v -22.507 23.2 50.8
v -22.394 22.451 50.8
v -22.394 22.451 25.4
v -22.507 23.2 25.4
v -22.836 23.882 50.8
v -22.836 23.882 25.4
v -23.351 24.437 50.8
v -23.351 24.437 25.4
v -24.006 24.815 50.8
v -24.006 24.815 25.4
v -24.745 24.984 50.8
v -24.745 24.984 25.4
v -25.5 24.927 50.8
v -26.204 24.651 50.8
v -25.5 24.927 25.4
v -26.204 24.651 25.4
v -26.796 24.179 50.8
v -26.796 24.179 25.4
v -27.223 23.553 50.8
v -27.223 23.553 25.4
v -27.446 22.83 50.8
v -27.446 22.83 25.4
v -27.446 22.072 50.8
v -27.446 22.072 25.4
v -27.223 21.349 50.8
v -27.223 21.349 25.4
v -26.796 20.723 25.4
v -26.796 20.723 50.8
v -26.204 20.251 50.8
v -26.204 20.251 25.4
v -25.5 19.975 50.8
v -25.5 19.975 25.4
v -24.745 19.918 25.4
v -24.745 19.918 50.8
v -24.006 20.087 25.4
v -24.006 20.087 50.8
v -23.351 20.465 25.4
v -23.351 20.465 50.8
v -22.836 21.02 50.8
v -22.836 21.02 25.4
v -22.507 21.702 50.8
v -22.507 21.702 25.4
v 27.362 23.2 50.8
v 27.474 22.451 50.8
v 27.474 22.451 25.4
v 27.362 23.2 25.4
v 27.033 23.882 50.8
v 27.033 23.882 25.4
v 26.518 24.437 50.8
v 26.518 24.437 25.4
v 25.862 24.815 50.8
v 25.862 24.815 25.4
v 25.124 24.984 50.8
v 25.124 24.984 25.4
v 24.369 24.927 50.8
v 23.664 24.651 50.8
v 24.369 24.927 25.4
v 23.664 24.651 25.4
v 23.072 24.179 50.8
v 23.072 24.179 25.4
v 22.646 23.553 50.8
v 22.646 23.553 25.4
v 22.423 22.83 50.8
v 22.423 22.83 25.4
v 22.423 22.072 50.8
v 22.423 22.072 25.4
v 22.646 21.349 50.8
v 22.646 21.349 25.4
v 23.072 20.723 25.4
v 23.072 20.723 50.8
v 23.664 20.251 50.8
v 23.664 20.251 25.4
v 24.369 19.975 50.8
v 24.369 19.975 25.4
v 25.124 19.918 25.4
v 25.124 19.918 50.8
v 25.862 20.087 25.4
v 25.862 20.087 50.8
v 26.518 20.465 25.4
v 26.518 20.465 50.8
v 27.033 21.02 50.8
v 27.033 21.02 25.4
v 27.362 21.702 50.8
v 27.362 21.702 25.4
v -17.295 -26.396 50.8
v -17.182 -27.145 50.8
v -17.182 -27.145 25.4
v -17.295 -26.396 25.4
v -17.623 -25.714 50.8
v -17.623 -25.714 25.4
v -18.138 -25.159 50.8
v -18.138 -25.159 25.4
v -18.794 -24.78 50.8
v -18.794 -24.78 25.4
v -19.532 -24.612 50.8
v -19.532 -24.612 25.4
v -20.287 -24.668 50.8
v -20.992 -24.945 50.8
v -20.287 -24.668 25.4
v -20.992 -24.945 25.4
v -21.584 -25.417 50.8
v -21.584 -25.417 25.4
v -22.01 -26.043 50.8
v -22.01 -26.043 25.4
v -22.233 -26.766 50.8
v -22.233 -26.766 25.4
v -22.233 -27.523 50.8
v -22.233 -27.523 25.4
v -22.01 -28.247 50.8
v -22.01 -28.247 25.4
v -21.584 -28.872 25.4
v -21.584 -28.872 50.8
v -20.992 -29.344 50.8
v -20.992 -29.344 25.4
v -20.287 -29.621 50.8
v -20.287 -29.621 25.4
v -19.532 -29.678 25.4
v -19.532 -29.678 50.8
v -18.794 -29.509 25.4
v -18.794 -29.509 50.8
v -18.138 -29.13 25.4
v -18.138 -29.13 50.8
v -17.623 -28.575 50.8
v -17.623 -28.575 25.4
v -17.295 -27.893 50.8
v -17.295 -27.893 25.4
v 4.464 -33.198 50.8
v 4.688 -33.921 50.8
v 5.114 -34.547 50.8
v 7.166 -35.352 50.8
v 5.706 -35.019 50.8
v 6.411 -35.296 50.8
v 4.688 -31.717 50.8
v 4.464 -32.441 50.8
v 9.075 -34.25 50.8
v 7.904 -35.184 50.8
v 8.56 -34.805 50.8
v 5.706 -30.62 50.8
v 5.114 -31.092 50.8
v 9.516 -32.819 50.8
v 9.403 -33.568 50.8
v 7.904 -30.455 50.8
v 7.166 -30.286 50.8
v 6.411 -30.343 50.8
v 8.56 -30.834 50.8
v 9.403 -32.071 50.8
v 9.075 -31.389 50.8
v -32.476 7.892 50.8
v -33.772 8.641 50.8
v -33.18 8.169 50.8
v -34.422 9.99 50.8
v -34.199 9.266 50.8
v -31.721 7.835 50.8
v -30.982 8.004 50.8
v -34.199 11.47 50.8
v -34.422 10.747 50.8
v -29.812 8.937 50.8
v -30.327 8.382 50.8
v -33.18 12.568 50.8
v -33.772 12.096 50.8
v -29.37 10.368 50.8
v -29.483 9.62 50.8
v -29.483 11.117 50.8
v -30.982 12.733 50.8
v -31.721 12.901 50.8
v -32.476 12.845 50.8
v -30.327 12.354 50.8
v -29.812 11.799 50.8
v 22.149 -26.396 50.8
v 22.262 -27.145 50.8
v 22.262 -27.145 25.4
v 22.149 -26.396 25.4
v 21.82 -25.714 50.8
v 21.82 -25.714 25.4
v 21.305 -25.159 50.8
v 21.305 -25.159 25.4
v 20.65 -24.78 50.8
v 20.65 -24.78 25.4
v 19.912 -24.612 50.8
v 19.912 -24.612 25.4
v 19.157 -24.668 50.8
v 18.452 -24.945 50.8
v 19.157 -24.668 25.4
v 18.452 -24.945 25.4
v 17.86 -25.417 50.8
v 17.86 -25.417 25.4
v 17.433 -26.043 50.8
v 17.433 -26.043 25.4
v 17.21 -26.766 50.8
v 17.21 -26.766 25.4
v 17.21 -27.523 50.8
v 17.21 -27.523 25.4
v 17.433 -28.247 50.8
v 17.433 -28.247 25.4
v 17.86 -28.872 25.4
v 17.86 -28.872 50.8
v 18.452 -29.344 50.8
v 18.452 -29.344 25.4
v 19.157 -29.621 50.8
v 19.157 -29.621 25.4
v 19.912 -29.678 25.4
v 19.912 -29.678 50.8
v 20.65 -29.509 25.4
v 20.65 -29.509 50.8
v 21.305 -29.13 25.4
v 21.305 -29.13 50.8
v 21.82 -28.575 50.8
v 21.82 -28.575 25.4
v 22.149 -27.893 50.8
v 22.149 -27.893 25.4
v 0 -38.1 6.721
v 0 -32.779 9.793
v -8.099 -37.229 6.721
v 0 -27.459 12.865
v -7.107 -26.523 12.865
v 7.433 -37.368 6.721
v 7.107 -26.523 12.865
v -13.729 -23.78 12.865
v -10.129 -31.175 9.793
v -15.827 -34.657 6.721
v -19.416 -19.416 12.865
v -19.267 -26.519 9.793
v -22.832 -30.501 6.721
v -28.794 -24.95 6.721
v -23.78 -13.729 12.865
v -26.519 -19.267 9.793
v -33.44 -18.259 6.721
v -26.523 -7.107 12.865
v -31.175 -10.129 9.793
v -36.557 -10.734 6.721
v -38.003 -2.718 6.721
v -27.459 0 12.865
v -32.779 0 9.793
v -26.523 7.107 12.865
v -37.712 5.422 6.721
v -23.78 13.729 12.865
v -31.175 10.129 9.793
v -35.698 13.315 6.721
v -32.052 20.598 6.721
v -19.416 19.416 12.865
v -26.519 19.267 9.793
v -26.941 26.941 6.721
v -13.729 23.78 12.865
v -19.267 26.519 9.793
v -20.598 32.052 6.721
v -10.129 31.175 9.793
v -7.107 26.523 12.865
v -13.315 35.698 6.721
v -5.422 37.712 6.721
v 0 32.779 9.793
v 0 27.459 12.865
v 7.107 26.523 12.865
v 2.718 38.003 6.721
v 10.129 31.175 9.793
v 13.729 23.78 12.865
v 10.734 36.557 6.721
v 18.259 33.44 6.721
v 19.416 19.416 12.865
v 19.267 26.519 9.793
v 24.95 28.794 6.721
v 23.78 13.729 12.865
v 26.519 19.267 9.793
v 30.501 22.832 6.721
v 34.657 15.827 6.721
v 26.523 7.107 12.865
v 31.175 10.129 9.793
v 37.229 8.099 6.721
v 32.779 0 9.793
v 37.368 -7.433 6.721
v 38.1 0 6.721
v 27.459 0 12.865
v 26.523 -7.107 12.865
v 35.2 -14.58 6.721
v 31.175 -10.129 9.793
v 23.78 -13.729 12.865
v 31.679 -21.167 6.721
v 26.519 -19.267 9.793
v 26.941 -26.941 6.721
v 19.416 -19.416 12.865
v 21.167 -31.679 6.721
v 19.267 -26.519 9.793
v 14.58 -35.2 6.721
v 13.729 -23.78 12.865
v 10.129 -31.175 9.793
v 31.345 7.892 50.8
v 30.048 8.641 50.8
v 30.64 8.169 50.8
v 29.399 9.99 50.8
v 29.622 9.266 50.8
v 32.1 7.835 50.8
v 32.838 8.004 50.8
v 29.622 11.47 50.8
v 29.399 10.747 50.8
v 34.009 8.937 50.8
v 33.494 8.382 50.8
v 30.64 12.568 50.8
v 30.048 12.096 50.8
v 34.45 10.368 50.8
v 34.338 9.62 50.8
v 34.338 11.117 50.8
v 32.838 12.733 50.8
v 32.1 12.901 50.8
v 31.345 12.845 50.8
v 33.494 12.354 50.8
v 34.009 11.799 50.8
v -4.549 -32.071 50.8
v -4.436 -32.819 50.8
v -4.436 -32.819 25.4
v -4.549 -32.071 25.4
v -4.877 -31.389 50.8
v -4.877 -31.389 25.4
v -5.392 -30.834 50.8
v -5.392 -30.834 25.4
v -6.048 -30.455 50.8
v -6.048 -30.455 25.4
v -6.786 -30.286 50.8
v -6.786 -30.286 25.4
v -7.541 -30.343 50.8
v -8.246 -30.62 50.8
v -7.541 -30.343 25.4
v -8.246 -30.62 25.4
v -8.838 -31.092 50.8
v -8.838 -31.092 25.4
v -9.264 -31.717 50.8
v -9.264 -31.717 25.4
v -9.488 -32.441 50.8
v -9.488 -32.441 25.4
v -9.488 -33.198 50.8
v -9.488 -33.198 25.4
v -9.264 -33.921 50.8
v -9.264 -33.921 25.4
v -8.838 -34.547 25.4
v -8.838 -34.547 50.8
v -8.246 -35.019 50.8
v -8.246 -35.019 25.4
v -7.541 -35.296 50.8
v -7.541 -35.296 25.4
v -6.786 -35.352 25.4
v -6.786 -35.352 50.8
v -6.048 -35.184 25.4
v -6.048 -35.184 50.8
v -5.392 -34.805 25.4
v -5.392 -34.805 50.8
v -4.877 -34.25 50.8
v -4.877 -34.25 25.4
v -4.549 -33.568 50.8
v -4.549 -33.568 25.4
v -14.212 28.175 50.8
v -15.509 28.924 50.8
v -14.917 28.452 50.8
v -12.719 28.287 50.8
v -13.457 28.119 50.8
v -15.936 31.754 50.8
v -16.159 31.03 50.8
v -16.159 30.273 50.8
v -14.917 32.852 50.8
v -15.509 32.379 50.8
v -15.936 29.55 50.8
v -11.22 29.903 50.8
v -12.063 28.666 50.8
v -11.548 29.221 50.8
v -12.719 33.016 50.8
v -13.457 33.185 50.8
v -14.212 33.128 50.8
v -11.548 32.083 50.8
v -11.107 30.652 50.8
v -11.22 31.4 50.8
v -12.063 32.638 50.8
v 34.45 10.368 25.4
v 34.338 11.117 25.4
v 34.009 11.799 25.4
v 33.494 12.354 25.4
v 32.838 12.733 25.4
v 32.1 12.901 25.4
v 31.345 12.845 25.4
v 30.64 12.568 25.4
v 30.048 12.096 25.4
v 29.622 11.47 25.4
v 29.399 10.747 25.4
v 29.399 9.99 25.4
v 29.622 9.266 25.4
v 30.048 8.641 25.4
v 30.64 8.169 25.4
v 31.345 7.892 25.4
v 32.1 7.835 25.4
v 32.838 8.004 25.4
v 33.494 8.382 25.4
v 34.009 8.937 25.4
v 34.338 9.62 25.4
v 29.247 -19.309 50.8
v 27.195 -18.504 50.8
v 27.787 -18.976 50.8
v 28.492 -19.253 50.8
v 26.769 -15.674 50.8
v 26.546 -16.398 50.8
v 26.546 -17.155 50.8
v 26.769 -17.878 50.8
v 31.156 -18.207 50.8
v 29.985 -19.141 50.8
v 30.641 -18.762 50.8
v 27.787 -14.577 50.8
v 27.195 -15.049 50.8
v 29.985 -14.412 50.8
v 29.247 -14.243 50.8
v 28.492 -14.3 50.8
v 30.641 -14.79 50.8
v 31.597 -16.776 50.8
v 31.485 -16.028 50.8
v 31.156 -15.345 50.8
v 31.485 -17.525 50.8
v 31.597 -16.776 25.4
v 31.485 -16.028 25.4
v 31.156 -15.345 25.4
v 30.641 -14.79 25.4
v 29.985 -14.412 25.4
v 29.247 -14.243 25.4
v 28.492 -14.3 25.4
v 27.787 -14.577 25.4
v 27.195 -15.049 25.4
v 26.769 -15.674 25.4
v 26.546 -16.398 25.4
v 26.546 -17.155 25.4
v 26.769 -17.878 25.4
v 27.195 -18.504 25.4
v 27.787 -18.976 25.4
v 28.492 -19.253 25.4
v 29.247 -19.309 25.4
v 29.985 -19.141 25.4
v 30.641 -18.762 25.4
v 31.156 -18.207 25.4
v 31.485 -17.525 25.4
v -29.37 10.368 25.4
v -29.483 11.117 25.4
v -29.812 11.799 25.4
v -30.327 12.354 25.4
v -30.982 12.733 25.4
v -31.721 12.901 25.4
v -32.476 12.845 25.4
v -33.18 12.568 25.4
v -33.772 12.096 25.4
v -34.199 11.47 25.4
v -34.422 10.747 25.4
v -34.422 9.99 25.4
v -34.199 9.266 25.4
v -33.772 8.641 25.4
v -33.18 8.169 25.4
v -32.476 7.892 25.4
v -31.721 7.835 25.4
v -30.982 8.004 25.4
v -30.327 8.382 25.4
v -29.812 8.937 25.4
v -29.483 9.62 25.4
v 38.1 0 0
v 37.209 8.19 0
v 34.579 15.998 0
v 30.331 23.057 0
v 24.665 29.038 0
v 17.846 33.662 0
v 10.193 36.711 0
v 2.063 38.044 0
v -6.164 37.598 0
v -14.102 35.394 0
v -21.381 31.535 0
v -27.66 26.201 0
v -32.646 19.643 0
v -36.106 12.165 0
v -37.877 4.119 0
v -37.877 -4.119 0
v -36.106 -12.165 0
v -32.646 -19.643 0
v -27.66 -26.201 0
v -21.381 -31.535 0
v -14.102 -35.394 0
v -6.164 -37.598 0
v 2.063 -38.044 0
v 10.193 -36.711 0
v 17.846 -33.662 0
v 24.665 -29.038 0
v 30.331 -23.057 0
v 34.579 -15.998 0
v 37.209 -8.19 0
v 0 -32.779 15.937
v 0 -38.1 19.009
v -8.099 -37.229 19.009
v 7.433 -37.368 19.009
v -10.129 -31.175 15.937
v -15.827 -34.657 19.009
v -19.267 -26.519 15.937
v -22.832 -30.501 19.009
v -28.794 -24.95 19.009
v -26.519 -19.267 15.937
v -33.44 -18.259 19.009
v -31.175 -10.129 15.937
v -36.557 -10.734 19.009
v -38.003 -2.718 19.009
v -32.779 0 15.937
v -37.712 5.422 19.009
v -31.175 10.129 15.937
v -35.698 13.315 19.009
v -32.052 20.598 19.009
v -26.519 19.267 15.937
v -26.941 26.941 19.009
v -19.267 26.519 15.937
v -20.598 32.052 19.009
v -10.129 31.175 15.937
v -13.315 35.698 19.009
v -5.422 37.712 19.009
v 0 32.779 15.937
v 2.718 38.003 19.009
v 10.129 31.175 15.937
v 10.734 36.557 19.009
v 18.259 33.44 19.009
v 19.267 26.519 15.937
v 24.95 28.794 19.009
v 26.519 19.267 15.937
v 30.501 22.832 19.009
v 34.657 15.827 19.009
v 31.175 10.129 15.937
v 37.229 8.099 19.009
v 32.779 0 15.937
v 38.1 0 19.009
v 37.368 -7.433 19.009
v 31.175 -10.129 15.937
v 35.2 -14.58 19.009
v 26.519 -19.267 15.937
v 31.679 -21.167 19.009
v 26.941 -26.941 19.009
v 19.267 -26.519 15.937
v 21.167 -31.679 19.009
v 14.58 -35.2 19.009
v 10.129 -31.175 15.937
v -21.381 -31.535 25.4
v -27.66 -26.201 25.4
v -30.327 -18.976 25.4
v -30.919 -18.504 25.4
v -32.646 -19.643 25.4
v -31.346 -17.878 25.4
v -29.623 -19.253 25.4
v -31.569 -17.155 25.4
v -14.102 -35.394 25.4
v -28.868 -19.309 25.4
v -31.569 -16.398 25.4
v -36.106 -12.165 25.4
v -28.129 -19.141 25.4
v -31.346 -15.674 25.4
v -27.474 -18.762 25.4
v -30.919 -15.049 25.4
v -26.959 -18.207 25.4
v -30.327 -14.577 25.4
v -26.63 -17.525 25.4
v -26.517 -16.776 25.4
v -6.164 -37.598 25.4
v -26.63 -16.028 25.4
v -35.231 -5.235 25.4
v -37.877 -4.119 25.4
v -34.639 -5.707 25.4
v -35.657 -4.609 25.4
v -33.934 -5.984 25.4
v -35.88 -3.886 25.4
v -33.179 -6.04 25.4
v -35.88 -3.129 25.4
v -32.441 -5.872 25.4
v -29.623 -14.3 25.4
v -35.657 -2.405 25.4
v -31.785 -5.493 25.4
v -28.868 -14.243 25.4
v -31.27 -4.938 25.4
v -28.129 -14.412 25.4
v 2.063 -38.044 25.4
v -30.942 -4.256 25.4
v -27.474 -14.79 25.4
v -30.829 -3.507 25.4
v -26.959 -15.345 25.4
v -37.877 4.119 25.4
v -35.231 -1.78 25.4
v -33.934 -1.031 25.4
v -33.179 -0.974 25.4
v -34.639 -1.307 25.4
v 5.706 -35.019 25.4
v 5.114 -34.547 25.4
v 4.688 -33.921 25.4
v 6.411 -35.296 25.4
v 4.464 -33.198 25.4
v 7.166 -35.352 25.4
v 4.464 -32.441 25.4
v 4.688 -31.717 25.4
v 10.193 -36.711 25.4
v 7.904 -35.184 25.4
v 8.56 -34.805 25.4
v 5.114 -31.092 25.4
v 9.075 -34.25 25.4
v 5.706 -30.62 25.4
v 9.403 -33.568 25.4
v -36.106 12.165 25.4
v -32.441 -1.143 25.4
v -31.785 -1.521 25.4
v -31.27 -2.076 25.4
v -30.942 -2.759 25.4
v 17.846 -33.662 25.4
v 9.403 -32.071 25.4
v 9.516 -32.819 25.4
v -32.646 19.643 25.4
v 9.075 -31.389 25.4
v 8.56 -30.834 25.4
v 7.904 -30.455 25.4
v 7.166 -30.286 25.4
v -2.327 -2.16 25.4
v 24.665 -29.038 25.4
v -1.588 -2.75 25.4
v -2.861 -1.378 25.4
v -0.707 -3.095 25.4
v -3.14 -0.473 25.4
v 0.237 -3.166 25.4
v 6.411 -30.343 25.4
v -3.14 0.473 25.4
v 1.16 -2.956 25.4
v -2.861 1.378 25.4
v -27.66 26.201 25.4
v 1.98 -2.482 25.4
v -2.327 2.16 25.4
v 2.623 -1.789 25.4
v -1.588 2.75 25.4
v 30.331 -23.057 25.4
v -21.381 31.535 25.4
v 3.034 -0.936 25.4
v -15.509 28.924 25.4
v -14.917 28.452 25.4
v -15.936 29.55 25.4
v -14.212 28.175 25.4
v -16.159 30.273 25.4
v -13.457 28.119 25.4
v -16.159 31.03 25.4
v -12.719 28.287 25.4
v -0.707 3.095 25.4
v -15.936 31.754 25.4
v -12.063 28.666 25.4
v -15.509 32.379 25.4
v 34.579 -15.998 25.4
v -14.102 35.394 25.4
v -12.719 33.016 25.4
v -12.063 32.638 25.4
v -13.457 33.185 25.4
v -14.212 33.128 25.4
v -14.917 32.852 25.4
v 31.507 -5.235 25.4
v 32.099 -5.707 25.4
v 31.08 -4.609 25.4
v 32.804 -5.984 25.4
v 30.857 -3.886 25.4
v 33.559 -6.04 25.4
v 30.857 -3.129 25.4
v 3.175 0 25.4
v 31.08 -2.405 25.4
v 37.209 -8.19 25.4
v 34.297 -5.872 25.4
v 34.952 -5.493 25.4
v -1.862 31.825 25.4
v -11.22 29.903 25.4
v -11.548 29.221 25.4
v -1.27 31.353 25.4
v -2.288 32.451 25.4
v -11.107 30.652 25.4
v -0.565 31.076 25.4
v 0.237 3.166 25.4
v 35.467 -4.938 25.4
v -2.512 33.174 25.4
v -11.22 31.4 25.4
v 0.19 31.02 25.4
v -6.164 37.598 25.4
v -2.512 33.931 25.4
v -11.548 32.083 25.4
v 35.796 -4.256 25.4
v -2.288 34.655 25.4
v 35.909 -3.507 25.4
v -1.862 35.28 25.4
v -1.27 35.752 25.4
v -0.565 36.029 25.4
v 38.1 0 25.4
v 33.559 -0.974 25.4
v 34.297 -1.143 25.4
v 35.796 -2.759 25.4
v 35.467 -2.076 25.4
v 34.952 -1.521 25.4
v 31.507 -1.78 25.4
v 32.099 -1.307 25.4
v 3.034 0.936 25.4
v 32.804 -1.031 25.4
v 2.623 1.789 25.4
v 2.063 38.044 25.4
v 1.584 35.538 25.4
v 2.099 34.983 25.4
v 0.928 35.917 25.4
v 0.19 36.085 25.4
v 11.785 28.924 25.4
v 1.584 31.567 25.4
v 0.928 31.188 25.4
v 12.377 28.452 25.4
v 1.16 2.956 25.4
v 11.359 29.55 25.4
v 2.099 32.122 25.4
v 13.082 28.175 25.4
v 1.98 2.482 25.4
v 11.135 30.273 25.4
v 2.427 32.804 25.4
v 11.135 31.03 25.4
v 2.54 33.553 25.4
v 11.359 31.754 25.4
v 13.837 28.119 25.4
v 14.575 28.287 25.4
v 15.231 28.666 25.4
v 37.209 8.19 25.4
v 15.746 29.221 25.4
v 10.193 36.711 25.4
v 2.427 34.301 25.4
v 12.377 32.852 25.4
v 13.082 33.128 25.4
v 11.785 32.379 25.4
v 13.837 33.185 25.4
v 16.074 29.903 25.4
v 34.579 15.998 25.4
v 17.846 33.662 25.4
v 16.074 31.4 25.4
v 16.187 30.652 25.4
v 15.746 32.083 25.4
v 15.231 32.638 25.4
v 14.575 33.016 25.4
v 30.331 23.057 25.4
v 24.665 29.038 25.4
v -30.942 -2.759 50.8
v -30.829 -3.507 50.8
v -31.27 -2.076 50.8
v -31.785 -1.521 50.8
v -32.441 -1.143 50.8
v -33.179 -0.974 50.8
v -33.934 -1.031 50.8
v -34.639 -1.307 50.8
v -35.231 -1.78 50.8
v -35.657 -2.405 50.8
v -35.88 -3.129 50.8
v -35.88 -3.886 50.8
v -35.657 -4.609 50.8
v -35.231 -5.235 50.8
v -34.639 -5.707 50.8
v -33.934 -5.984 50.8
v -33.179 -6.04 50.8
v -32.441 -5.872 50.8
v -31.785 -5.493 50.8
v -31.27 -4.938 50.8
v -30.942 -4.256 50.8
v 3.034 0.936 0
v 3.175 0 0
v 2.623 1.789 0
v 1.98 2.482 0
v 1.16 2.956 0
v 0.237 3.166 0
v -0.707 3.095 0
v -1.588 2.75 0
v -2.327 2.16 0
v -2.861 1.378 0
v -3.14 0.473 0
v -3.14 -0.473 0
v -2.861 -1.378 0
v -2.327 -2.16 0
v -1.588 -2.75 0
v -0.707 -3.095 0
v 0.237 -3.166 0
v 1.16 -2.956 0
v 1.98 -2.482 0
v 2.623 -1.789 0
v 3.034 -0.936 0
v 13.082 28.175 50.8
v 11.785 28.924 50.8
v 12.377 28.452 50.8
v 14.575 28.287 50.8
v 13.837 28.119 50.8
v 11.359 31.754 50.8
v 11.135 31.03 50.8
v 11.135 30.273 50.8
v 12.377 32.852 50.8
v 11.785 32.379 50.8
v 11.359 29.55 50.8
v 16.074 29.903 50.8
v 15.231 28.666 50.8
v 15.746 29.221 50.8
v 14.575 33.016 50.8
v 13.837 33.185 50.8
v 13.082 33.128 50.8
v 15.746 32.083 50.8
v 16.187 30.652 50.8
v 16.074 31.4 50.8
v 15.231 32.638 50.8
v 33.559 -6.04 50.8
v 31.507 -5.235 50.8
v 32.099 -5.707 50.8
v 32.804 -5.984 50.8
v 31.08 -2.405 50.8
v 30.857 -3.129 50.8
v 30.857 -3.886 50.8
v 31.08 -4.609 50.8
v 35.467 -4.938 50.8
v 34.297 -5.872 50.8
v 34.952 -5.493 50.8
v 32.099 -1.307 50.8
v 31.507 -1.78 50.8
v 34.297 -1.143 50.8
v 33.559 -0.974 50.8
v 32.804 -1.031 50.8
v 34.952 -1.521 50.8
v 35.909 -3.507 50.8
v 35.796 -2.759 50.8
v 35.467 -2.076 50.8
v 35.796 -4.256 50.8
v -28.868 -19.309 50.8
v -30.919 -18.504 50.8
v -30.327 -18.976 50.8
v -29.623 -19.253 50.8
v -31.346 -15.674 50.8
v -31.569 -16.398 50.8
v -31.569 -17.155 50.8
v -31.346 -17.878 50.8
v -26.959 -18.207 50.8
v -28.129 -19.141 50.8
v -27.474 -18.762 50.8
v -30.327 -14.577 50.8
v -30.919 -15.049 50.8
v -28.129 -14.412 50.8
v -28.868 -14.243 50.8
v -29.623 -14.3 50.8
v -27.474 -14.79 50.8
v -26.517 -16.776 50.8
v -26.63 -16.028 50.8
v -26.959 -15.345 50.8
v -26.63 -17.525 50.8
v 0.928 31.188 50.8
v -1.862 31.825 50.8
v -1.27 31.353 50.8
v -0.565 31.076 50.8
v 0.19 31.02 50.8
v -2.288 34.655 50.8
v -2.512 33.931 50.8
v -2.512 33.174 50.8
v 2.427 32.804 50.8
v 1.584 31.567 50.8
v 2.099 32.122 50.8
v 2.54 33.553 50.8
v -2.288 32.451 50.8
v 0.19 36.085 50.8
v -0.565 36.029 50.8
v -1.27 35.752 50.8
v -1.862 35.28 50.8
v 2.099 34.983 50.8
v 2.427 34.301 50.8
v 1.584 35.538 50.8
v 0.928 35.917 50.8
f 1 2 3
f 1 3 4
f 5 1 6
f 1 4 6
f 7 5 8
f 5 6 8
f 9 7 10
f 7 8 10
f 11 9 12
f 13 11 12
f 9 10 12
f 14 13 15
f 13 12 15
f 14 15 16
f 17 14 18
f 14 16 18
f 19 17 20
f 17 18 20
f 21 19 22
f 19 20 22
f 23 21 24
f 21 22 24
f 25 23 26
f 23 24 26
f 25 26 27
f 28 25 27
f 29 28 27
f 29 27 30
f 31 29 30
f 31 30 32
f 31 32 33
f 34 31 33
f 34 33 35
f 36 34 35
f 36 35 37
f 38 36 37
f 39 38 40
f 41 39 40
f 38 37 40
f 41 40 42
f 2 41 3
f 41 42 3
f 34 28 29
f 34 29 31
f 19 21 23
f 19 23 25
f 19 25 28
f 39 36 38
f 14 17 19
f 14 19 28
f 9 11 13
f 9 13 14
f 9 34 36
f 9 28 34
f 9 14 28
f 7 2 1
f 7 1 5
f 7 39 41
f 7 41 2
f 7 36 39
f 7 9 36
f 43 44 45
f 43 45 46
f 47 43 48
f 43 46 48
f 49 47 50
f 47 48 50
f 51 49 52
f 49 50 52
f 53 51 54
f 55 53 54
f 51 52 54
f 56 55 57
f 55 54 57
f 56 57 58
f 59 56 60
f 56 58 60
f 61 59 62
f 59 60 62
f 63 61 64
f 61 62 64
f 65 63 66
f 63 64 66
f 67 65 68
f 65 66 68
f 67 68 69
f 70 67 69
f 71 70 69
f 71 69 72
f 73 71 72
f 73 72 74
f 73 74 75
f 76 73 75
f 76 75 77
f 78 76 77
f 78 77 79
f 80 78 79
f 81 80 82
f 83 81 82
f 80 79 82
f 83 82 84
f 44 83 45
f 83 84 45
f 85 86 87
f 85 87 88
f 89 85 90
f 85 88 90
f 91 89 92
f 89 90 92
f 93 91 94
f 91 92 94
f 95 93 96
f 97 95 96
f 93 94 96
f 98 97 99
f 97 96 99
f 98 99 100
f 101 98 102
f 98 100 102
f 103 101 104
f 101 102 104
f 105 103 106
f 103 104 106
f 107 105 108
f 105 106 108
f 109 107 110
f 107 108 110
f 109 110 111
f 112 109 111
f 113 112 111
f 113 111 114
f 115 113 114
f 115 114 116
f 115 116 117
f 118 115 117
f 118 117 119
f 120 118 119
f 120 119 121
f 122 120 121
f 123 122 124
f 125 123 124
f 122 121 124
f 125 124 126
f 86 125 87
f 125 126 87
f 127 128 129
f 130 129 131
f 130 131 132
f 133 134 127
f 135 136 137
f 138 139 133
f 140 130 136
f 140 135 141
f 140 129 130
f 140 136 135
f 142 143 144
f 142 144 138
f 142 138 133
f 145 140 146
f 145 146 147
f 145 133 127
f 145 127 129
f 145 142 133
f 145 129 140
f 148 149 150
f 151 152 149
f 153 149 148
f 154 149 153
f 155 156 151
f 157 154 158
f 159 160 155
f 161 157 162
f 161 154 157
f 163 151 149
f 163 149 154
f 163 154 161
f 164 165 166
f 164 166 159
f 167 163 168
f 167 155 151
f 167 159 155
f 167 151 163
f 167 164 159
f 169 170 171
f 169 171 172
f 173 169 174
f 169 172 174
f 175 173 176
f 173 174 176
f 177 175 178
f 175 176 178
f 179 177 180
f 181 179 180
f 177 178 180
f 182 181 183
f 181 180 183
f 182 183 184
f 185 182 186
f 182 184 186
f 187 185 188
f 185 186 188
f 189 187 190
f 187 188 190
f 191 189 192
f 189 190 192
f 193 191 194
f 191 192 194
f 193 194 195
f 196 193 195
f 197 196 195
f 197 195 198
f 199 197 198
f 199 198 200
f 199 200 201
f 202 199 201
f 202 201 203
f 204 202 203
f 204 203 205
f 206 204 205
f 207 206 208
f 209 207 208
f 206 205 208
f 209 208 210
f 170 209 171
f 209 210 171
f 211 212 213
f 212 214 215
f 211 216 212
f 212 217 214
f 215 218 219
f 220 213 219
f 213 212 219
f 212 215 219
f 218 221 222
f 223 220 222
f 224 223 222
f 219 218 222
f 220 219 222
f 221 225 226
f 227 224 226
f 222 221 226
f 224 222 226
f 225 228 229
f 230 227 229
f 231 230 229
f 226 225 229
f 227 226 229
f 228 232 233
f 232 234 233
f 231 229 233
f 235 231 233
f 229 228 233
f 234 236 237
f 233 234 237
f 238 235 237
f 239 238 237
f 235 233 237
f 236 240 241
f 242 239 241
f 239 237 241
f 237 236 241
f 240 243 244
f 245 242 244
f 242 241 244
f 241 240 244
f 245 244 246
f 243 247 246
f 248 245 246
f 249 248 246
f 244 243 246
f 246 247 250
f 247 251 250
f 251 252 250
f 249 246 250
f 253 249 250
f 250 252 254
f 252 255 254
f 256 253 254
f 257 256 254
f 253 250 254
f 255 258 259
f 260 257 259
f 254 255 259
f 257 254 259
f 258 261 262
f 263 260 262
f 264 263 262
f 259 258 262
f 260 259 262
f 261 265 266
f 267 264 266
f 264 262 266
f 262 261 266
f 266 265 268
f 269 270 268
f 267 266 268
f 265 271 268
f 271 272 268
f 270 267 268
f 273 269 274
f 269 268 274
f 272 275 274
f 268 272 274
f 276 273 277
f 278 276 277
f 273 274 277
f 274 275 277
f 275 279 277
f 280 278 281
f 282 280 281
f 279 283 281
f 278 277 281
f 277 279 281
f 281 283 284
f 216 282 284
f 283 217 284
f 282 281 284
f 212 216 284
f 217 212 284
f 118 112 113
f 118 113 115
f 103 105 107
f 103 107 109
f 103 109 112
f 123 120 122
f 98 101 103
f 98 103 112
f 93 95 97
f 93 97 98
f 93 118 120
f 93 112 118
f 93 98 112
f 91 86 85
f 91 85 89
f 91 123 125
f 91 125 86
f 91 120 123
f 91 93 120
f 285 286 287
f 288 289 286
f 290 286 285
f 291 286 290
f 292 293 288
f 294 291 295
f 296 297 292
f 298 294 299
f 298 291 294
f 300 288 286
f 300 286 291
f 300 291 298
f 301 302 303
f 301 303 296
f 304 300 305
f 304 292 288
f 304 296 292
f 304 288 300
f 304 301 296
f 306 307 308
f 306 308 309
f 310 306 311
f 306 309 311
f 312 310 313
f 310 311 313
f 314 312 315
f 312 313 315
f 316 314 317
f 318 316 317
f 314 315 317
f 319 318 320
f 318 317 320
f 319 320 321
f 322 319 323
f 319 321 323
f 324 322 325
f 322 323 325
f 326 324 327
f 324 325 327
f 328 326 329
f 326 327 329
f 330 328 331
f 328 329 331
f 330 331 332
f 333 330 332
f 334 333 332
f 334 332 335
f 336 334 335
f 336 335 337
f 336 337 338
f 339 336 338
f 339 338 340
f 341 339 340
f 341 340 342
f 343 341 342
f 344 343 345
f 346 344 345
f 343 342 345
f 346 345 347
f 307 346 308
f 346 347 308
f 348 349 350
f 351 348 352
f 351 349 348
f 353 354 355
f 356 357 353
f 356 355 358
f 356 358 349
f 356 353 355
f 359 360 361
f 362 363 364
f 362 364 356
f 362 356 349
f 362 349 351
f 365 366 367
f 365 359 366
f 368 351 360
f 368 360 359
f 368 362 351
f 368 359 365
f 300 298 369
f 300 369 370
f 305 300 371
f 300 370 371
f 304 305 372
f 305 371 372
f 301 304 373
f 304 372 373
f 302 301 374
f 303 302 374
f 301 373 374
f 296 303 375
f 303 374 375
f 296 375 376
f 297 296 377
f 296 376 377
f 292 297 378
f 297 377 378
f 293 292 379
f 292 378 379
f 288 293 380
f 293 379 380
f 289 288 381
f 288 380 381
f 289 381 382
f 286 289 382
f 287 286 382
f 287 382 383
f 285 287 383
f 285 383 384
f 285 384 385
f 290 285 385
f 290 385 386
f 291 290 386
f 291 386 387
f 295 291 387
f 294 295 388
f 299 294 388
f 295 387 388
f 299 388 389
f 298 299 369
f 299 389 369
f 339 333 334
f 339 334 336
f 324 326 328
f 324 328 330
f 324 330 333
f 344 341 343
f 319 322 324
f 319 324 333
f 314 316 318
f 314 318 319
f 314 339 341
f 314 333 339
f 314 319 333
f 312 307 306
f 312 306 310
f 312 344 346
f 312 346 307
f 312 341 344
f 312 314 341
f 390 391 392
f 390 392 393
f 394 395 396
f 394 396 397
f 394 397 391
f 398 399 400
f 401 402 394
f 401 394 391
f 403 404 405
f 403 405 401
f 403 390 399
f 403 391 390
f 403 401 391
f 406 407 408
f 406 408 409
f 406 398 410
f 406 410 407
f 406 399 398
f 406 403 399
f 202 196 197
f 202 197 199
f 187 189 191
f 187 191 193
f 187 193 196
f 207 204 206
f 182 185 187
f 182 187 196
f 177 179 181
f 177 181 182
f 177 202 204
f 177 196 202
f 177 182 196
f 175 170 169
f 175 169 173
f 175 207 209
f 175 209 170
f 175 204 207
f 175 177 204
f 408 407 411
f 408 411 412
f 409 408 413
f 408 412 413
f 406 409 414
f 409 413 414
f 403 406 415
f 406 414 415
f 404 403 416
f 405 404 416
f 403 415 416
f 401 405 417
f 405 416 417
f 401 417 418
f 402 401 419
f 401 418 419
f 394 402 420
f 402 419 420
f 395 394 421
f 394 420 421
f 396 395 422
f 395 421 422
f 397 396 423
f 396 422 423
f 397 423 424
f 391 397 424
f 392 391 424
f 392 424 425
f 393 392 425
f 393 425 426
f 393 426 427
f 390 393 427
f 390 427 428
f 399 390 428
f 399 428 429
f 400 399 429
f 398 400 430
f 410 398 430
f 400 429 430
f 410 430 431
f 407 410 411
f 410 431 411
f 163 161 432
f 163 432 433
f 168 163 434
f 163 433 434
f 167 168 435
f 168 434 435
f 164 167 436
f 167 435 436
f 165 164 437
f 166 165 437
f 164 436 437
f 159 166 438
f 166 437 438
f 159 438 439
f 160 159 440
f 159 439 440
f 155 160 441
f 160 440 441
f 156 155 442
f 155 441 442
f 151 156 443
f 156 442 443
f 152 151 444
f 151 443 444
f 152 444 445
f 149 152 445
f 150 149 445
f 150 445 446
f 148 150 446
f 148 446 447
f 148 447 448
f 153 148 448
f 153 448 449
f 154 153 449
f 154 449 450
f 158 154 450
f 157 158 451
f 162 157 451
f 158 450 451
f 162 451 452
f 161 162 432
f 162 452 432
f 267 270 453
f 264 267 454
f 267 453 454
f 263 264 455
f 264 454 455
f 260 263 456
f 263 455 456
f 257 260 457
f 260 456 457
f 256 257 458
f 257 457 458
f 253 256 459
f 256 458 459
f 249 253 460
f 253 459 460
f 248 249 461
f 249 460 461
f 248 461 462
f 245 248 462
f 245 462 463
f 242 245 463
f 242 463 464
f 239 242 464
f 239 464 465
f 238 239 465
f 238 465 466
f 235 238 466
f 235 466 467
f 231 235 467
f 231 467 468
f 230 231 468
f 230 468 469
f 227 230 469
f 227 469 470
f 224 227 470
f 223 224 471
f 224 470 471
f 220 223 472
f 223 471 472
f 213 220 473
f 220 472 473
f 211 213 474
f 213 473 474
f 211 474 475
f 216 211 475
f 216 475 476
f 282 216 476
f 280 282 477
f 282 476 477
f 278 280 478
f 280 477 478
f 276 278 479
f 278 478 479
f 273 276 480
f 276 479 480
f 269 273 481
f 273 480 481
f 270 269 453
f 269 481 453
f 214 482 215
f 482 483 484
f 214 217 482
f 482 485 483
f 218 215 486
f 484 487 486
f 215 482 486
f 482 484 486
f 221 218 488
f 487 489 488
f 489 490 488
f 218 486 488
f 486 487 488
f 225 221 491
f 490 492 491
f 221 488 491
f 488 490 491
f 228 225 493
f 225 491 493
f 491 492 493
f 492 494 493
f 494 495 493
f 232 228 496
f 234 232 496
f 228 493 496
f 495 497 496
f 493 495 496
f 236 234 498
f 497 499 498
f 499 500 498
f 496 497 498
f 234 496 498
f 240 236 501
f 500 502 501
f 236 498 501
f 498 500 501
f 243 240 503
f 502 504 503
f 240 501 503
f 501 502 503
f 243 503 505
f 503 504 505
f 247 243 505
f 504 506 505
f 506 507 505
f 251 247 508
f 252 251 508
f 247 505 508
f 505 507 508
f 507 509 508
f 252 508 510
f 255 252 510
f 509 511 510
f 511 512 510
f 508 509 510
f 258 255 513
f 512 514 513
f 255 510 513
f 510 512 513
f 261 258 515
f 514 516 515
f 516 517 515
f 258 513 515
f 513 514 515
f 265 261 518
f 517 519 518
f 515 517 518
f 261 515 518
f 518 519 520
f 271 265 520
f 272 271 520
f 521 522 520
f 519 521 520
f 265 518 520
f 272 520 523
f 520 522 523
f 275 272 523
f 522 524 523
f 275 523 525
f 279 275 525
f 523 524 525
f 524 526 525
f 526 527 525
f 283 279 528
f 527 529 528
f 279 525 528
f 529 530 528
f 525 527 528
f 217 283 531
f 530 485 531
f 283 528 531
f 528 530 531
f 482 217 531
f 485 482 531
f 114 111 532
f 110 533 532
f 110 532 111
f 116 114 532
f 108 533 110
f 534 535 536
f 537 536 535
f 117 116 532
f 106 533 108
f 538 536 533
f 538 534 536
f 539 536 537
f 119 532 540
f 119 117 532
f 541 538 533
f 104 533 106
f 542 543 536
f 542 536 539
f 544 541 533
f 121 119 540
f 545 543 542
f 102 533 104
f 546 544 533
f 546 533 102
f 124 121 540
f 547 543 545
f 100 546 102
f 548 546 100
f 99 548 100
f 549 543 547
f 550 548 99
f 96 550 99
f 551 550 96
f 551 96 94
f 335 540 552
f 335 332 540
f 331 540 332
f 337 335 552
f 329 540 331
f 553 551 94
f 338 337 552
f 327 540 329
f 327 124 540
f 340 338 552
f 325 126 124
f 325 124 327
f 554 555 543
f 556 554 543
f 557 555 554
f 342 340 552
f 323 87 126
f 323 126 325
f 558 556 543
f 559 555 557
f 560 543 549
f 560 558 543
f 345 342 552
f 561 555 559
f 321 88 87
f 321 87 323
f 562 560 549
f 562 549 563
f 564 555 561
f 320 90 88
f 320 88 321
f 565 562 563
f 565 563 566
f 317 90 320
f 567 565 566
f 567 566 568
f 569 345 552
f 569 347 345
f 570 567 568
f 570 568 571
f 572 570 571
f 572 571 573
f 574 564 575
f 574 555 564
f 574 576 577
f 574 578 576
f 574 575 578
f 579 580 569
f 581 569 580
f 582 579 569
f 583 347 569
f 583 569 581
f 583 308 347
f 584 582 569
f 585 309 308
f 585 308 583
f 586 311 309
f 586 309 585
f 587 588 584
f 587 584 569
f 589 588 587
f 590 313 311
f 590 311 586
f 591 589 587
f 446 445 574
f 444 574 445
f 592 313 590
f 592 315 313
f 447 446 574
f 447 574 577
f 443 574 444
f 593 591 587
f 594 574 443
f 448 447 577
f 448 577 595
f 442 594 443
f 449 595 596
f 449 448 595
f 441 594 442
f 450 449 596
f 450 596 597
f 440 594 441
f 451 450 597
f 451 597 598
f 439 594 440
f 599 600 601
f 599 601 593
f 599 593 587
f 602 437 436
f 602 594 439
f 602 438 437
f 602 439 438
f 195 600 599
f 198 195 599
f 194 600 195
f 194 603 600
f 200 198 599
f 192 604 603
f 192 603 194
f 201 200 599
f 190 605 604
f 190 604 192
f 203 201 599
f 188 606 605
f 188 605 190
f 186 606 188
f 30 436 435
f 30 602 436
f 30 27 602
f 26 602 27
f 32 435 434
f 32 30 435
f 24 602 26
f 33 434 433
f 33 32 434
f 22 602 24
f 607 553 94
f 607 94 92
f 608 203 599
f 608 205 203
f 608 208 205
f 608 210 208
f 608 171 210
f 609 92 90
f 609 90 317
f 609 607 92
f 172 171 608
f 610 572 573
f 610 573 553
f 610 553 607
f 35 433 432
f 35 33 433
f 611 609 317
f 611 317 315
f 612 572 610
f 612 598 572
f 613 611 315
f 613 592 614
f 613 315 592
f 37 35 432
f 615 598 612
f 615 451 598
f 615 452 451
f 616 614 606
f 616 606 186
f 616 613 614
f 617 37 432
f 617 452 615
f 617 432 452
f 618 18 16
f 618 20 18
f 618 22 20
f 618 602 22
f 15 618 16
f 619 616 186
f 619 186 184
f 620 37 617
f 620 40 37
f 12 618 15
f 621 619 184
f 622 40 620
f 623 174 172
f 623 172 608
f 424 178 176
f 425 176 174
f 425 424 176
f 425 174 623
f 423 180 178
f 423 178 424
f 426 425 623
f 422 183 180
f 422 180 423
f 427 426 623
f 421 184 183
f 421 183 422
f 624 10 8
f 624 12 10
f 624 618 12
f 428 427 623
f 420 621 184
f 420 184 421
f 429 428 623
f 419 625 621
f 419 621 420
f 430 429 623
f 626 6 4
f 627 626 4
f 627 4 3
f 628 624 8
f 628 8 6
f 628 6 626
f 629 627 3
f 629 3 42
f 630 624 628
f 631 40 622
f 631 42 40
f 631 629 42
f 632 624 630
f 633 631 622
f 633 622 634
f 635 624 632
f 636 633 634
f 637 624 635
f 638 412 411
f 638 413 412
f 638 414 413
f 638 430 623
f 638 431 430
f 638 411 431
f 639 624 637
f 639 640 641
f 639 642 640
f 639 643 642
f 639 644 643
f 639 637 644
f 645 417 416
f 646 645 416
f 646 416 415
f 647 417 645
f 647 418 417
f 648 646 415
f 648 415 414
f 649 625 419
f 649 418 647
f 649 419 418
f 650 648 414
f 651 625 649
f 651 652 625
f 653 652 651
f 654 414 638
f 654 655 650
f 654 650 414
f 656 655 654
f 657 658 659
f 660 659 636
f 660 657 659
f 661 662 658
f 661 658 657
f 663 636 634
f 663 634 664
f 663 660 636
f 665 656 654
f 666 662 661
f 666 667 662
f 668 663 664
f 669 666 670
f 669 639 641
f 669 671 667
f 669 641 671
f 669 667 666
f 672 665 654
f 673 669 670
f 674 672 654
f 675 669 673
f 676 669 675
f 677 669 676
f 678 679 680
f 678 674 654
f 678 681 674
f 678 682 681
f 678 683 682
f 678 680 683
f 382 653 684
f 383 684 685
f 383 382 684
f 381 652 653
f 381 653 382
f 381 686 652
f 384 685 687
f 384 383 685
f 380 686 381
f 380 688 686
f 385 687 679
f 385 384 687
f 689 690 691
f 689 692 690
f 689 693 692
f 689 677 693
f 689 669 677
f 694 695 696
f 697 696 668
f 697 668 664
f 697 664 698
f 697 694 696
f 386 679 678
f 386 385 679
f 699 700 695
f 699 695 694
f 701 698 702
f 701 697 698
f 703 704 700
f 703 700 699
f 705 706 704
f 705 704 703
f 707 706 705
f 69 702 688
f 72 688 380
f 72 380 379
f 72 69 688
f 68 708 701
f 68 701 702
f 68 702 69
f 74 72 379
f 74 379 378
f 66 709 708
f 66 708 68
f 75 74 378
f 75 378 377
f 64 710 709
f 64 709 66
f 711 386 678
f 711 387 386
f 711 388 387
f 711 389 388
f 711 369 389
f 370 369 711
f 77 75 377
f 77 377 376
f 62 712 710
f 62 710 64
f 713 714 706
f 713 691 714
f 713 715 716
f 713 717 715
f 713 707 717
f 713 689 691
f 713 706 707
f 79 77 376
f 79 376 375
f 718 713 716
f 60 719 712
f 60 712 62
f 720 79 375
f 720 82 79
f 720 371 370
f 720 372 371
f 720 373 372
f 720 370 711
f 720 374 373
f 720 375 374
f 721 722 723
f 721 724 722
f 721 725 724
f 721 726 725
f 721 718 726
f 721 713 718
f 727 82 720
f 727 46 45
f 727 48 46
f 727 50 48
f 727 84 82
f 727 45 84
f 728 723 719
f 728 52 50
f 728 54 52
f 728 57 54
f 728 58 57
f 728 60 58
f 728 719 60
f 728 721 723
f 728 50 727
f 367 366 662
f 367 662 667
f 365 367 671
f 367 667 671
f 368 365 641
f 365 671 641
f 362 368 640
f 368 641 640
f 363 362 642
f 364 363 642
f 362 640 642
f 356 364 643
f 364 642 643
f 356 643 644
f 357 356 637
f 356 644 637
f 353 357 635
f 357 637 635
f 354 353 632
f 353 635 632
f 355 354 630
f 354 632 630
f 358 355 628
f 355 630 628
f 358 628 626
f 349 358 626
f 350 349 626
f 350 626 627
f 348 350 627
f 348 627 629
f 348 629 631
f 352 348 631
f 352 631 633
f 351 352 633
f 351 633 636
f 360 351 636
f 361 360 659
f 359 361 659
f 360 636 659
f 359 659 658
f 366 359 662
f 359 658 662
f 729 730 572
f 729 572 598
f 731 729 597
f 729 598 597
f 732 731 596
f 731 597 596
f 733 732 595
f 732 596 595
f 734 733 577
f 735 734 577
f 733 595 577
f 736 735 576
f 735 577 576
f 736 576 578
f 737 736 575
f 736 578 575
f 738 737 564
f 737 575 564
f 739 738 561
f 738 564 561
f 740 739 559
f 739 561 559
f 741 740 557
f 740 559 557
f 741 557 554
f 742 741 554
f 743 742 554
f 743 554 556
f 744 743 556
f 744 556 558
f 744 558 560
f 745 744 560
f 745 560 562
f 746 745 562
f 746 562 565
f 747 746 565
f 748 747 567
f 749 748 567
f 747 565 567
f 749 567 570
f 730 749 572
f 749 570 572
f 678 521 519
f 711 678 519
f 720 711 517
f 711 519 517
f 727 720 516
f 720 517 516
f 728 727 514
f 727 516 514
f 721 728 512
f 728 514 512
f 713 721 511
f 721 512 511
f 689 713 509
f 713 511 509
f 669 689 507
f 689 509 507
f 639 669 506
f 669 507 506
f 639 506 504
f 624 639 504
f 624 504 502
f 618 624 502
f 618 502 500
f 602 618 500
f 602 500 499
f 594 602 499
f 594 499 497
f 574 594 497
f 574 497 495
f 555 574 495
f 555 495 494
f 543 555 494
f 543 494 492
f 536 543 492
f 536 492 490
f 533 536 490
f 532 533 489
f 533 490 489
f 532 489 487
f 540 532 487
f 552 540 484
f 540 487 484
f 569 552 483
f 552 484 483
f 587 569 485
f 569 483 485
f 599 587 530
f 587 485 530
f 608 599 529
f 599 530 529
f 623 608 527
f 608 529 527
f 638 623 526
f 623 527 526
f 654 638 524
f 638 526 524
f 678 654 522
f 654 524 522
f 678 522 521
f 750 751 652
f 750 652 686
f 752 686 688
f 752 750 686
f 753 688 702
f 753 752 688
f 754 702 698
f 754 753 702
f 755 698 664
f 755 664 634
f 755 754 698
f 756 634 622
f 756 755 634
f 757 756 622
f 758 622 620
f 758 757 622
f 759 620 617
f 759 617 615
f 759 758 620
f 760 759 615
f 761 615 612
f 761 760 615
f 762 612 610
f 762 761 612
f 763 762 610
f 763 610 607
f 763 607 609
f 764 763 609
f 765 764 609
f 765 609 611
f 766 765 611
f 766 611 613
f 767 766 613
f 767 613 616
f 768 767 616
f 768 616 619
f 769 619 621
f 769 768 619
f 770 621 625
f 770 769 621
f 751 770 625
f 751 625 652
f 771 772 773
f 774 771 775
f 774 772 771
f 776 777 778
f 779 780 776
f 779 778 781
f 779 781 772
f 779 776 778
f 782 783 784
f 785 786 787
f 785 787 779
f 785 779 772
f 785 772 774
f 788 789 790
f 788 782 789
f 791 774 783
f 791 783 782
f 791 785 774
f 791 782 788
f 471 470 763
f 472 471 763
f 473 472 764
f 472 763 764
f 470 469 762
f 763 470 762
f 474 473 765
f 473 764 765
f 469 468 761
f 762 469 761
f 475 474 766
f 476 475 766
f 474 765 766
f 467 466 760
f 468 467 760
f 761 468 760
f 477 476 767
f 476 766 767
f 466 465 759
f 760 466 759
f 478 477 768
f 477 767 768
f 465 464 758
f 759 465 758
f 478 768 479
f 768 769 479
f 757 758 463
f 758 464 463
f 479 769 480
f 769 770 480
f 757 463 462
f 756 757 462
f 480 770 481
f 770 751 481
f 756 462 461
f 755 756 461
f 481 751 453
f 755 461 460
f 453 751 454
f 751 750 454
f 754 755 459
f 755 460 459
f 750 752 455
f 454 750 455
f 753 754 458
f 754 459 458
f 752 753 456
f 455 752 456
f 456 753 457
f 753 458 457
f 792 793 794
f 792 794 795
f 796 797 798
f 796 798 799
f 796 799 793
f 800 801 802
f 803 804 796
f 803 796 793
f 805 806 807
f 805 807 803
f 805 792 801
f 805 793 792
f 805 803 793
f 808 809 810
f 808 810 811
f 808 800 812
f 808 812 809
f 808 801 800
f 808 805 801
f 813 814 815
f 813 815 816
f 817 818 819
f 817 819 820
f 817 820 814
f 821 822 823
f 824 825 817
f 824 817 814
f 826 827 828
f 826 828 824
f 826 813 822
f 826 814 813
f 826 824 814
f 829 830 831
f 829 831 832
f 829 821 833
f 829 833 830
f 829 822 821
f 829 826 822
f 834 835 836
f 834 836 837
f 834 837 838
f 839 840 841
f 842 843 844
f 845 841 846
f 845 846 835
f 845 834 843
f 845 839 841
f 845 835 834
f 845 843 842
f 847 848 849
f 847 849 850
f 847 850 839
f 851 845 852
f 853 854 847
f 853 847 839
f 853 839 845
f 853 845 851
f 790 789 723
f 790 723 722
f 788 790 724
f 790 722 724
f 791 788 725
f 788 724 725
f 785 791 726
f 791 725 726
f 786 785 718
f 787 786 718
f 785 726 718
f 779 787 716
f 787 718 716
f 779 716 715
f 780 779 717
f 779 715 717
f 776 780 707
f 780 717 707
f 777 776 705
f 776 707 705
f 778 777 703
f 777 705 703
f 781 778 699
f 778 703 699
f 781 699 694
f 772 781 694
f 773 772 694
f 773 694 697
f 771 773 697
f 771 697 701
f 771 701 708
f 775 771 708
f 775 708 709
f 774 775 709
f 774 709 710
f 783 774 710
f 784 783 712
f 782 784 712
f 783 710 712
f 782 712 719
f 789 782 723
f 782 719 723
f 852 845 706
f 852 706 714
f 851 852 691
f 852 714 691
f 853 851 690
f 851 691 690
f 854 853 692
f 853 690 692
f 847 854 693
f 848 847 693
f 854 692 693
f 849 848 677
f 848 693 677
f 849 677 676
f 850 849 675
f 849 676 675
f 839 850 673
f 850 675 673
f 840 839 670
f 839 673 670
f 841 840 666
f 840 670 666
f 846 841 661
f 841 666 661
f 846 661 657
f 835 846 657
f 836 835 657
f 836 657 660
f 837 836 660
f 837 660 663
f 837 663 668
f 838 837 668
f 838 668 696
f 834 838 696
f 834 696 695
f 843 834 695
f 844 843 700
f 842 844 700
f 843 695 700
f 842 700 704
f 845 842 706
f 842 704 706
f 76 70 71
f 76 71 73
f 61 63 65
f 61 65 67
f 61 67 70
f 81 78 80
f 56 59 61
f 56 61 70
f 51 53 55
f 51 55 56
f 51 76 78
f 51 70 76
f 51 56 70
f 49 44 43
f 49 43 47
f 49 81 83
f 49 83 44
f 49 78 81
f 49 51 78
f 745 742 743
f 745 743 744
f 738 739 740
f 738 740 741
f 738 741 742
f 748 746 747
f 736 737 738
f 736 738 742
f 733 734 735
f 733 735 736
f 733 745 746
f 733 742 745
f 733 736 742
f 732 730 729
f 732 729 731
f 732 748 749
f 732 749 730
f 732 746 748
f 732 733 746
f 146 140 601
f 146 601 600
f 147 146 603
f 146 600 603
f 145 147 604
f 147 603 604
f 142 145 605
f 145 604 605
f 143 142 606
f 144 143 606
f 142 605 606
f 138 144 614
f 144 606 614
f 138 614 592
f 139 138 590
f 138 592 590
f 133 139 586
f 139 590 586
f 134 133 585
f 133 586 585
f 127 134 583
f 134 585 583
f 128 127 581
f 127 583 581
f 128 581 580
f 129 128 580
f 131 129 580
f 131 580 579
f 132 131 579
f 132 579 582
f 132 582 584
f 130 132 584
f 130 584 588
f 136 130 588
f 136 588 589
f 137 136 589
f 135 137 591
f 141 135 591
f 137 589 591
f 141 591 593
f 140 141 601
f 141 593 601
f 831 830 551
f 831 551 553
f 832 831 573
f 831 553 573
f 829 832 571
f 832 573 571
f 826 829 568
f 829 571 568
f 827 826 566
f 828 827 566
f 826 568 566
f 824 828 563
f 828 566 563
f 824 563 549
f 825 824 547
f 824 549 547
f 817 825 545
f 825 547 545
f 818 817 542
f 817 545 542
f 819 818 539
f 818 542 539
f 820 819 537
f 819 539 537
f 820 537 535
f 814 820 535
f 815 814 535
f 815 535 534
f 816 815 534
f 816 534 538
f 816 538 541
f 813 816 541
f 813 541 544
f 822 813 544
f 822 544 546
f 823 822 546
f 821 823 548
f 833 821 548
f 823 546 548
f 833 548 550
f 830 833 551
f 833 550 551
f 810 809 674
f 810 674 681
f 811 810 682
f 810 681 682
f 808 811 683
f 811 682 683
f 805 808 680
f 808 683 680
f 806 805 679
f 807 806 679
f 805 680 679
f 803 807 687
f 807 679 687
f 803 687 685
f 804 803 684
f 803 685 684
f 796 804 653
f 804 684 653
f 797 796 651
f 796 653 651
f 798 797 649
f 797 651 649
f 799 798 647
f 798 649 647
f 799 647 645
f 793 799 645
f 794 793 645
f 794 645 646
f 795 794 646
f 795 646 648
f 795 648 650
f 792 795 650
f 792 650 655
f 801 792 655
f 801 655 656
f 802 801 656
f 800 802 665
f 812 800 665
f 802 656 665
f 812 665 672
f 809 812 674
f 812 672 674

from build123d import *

# Parameters (mm, degrees)
F0_R     = 38.1
F0_R_2   = 3.175
F1_DEPTH = 25.4
F2_R     = 2.54
F3_DEPTH = 25.4


with BuildPart() as f1:
    # F0 (on Top) → F1 (new body)
    with BuildSketch(Plane.XY):
        Circle(F0_R)
        Circle(F0_R_2, mode=Mode.SUBTRACT)
    extrude(amount=F1_DEPTH)

    # F2 (on face) → F3 (join)
    with BuildSketch(Plane.XY.offset(25.4)):
        with Locations((13.647064, 30.651807)):
            Circle(F2_R)
        with Locations((0, 33.55258)):
            Circle(F2_R)
        with Locations((-13.647064, 30.651807)):
            Circle(F2_R)
        with Locations((-24.934426, 22.451058)):
            Circle(F2_R)
        with Locations((-31.910399, 10.368317)):
            Circle(F2_R)
        with Locations((-33.368775, -3.5072)):
            Circle(F2_R)
        with Locations((-29.057386, -16.77629)):
            Circle(F2_R)
        with Locations((-19.721711, -27.144607)):
            Circle(F2_R)
        with Locations((-6.975974, -32.819375)):
            Circle(F2_R)
        with Locations((6.975974, -32.819375)):
            Circle(F2_R)
        with Locations((19.721711, -27.144607)):
            Circle(F2_R)
        with Locations((29.057386, -16.77629)):
            Circle(F2_R)
        with Locations((33.368775, -3.5072)):
            Circle(F2_R)
        with Locations((31.910399, 10.368317)):
            Circle(F2_R)
        with Locations((24.934426, 22.451058)):
            Circle(F2_R)
    extrude(amount=F3_DEPTH)

    # F5 (on Right) → F6 (revolve, cut)
    with BuildSketch(Plane.YZ):
        Polygon((-27.45885, 12.864876), (-38.457373, 19.214876), (-38.457373, 6.514876), align=None)
    revolve(axis=Axis((0, 0, 4.729655), (0, 0, -1)), mode=Mode.SUBTRACT)


solid = f1.part
